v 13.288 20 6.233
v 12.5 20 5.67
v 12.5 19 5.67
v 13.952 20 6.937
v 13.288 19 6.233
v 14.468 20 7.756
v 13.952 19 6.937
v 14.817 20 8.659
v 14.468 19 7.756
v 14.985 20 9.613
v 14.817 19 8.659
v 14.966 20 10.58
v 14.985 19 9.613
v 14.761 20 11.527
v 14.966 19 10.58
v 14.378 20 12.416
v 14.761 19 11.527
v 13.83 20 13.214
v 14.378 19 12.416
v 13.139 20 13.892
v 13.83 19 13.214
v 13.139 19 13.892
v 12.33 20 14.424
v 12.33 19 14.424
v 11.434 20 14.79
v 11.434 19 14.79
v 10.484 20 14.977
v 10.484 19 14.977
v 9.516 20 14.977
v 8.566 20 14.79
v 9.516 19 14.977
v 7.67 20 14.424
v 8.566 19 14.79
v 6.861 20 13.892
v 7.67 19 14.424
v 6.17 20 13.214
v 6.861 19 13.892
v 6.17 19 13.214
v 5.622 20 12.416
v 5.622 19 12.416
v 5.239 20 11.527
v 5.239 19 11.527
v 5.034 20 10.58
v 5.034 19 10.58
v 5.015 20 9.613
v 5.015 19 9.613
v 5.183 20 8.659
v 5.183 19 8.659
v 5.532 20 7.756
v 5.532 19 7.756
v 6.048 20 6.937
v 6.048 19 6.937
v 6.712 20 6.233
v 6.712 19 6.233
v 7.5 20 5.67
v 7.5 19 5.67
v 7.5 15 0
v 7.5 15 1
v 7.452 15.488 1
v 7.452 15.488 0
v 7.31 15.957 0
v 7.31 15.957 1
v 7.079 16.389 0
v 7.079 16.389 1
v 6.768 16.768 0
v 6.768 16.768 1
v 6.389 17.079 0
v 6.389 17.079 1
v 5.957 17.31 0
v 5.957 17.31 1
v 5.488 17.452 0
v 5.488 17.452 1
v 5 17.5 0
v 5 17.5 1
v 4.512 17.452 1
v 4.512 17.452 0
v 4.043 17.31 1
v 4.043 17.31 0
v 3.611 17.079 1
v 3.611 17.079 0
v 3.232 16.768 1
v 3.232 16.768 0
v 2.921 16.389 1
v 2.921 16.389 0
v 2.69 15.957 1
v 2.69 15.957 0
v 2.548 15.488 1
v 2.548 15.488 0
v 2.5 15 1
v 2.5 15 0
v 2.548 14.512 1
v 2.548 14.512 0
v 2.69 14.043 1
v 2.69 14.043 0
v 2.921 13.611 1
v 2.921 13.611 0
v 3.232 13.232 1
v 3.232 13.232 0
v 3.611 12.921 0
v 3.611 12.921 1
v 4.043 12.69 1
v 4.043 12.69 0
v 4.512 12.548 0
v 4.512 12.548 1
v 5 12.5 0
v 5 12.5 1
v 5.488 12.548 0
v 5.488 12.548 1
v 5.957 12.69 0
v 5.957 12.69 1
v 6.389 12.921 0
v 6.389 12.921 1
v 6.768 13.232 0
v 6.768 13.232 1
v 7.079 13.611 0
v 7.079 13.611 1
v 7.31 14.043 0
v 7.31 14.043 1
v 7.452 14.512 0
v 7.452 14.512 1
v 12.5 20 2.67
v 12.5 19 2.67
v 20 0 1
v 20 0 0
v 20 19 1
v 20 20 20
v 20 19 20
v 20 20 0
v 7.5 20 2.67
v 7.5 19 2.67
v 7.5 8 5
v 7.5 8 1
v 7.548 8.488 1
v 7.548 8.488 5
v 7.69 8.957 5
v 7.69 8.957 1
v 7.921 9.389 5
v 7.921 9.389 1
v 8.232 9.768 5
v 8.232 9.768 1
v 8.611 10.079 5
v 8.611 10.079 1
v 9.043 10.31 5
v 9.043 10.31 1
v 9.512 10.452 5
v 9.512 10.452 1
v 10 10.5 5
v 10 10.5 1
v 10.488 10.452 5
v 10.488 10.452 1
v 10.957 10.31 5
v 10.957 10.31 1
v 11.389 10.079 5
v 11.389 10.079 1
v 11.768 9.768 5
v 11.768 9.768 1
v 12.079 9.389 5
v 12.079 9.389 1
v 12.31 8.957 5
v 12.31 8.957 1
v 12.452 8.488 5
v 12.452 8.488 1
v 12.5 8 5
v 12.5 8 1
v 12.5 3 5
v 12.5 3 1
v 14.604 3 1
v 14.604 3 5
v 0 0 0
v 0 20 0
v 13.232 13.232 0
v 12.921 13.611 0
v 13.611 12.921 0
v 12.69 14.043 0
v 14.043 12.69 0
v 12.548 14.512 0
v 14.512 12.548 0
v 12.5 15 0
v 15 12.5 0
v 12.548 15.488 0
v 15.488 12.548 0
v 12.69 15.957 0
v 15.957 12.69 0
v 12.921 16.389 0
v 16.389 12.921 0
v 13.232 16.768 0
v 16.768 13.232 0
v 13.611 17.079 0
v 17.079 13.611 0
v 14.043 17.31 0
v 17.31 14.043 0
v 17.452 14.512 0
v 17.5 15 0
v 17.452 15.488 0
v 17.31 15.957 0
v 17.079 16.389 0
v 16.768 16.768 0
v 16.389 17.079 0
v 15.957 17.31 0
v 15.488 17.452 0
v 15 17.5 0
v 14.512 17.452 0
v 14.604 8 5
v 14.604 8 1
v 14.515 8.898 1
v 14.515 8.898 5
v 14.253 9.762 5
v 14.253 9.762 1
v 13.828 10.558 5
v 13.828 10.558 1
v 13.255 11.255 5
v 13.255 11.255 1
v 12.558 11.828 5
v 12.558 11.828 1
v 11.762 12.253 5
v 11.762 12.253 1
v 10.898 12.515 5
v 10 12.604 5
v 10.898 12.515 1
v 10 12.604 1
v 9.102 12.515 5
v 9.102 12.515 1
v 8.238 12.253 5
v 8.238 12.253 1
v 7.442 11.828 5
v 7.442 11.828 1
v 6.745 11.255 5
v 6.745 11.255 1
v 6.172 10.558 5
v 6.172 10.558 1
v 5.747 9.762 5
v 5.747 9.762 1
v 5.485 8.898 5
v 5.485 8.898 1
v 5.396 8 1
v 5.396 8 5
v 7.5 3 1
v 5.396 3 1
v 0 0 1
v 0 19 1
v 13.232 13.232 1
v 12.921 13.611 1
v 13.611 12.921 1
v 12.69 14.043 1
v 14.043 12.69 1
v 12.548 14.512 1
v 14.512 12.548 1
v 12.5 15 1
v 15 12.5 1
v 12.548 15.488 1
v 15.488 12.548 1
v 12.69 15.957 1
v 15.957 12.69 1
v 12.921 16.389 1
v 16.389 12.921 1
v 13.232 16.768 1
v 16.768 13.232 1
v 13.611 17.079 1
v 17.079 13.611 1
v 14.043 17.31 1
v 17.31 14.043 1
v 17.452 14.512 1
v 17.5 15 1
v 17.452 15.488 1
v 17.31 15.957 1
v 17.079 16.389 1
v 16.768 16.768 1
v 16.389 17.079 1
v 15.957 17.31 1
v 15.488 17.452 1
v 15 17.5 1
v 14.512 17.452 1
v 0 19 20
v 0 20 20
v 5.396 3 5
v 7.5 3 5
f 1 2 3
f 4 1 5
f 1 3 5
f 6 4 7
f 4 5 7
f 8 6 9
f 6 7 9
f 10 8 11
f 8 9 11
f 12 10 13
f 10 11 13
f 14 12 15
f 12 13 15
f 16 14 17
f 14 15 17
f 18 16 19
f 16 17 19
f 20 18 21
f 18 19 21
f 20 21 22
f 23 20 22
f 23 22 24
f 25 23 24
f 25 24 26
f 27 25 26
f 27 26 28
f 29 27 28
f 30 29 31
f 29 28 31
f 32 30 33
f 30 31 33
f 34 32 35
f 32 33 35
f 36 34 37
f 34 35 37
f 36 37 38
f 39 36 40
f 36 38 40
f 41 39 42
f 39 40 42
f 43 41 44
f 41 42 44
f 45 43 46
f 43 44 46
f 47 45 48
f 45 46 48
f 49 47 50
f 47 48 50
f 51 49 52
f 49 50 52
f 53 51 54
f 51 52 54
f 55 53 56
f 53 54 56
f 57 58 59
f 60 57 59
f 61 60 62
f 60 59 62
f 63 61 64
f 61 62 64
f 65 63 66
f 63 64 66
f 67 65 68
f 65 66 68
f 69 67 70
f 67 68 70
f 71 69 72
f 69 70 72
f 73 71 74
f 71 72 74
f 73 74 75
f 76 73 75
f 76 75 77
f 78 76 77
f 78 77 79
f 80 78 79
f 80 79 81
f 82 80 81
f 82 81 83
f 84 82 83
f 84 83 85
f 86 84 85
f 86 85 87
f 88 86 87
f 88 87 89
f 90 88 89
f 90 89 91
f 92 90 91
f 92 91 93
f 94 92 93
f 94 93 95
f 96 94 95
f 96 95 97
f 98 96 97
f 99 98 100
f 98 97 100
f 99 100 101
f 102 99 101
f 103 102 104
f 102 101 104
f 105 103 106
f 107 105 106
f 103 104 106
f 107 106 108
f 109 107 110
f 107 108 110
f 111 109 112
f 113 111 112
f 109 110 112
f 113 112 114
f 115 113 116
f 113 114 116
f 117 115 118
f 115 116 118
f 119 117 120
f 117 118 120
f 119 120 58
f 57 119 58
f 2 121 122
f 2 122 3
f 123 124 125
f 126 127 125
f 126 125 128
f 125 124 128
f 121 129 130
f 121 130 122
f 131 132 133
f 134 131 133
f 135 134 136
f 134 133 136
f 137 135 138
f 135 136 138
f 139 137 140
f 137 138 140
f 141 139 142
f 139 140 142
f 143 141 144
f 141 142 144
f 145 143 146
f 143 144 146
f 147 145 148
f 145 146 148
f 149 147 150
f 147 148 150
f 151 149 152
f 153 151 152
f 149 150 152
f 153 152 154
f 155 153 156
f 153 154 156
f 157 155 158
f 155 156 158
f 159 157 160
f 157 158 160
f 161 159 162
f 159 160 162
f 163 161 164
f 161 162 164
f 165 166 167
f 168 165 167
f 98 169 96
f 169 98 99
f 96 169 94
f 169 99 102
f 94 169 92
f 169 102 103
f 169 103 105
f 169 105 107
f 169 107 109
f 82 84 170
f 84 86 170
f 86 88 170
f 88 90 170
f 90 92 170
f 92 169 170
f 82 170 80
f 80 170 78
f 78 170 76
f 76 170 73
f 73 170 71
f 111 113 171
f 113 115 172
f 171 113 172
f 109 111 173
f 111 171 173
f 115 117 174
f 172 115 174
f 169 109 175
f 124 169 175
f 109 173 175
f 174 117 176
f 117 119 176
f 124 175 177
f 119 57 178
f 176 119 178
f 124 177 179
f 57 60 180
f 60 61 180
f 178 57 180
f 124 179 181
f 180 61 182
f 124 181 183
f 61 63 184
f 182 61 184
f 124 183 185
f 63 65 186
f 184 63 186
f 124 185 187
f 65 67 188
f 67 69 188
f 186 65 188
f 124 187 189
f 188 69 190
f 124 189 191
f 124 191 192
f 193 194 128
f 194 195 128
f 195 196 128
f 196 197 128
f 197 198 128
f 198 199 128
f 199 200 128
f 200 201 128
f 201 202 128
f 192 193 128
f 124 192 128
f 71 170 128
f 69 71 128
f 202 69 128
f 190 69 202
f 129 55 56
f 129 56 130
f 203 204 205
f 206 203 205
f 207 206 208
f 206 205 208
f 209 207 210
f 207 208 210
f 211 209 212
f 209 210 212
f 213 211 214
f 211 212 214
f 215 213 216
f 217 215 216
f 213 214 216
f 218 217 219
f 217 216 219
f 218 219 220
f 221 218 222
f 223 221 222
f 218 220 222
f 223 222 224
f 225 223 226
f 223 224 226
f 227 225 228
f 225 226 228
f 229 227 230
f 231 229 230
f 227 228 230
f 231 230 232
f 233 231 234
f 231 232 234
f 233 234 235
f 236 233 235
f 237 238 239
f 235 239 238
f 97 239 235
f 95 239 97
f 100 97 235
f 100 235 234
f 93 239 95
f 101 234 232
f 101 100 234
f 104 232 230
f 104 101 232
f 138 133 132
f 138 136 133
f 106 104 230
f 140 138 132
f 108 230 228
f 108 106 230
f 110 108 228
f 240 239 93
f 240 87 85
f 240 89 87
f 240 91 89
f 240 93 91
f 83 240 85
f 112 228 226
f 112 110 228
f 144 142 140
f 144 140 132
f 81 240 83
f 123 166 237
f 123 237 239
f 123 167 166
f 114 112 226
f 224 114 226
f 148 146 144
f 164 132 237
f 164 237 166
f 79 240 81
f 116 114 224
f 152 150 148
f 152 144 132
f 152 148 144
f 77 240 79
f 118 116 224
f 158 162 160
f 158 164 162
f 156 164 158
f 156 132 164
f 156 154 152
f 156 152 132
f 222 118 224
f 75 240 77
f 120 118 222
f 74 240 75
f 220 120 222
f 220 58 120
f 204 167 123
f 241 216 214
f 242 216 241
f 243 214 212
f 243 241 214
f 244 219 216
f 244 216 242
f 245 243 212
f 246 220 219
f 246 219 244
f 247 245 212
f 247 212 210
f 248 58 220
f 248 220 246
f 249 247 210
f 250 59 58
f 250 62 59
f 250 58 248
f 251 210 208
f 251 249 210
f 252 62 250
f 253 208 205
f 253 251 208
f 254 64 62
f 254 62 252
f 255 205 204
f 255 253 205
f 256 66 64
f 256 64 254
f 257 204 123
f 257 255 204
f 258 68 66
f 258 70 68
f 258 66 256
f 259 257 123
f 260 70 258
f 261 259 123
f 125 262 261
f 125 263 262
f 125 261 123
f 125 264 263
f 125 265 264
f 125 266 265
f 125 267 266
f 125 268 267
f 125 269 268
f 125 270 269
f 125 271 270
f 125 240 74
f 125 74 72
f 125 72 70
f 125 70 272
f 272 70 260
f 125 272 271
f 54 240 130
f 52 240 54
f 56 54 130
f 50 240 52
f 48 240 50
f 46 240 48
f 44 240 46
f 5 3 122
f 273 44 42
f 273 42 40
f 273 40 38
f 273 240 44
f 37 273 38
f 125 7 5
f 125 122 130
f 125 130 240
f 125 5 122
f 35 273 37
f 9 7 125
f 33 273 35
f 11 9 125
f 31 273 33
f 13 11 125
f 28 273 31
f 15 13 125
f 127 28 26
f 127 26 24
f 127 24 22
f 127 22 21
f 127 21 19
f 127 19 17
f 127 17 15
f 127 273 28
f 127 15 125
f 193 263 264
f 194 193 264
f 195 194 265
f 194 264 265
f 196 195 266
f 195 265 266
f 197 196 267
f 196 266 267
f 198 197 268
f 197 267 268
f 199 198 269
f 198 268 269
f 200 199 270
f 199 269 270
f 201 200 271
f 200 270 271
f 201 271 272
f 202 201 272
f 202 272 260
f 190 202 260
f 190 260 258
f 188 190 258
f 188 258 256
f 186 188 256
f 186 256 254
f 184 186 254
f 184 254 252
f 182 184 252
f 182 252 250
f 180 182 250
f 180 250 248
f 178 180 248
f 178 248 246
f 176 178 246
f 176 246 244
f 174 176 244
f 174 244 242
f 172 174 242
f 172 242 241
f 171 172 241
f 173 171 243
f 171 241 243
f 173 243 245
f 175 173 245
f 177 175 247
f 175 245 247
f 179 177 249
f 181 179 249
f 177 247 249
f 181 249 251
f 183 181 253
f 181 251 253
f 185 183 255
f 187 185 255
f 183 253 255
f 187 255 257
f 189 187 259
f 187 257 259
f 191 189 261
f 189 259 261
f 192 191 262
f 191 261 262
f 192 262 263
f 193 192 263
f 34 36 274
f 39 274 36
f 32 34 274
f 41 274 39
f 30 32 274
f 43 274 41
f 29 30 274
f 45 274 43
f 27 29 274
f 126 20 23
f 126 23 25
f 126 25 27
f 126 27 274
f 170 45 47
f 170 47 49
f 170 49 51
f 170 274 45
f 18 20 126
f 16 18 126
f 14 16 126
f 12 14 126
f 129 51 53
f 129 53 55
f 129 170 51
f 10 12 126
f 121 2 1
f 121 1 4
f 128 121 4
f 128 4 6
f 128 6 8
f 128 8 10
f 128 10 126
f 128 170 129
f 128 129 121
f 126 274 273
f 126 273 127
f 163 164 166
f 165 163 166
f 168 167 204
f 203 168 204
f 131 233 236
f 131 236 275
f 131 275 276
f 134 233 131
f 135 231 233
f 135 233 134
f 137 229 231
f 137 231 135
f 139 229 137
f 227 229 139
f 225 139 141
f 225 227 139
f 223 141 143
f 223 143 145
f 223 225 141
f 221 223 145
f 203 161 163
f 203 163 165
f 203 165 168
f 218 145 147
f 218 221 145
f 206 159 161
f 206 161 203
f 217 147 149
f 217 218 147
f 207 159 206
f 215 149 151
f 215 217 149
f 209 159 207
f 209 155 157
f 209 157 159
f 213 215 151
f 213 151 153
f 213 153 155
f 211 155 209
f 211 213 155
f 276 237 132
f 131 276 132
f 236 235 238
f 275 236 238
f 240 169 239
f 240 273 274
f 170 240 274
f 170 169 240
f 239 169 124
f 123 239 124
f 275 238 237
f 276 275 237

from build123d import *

# Parameters (mm, degrees)
SKETCH2_W           = 20
SKETCH2_H           = 20
BOSS_EXTRUDE1_DEPTH = 20
SKETCH3_W           = 20
SKETCH3_H           = 19
CUT_EXTRUDE1_DEPTH  = 19
SKETCH4_R           = 5
CUT_EXTRUDE2_DEPTH  = 17.5
BOSS_EXTRUDE2_DEPTH = 4
SKETCH10_R          = 2.5
CUT_EXTRUDE3_DEPTH  = 2
CUT_EXTRUDE4_DEPTH  = 2


with BuildPart() as part:
    # Sketch2 → Boss-Extrude1 (new body)
    with BuildSketch(Plane.XY):
        with Locations((10, 10)):
            Rectangle(SKETCH2_W, SKETCH2_H)
    extrude(amount=BOSS_EXTRUDE1_DEPTH)

    # Sketch3 → Cut-Extrude1 (cut)
    with BuildSketch(Plane.XY.offset(20)):
        with Locations((10, 9.5)):
            Rectangle(SKETCH3_W, SKETCH3_H)
    extrude(amount=-CUT_EXTRUDE1_DEPTH, mode=Mode.SUBTRACT)

    # Sketch4 → Cut-Extrude2 (cut)
    with BuildSketch(Plane.XZ.offset(-19)):
        with Locations((10, 10)):
            Circle(SKETCH4_R)
    extrude(amount=-CUT_EXTRUDE2_DEPTH, mode=Mode.SUBTRACT)

    # Sketch6 → Boss-Extrude2 (add)
    with BuildSketch(Plane.XY.offset(1)):
        with BuildLine():
            Line((7.5, 3), (7.5, 8))
            ThreePointArc((7.5, 8), (10, 10.5), (12.5, 8))
            Line((12.5, 8), (12.5, 3))
            Line((12.5, 3), (14.603533184, 3))
            Line((14.603533184, 3), (14.603533184, 8))
            ThreePointArc((14.603533184, 8), (10, 12.603533184), (5.396466816, 8))
            Line((5.396466816, 8), (5.396466816, 3))
            Line((5.396466816, 3), (7.5, 3))
        make_face()
    extrude(amount=BOSS_EXTRUDE2_DEPTH)

    # Sketch10 → Cut-Extrude3 (cut, through all)
    with BuildSketch(Plane.XY.offset(1)):
        with Locations((5, 15)):
            Circle(SKETCH10_R)
        with Locations((15, 15)):
            Circle(SKETCH10_R)
    extrude(amount=-CUT_EXTRUDE3_DEPTH, mode=Mode.SUBTRACT)

    # Sketch11 → Cut-Extrude4 (cut)
    with BuildSketch(Plane(origin=(0, 20, 0), x_dir=(1, 0, 0), z_dir=(0, 1, 0))):
        with BuildLine():
            Line((7.5, -5.669872981), (7.5, -2.669872981))
            Line((7.5, -2.669872981), (12.5, -2.669872981))
            Line((12.5, -2.669872981), (12.5, -5.669872981))
            ThreePointArc((12.5, -5.669872981), (10, -5), (7.5, -5.669872981))
        make_face()
    extrude(amount=-CUT_EXTRUDE4_DEPTH, mode=Mode.SUBTRACT)


solid = part.part
